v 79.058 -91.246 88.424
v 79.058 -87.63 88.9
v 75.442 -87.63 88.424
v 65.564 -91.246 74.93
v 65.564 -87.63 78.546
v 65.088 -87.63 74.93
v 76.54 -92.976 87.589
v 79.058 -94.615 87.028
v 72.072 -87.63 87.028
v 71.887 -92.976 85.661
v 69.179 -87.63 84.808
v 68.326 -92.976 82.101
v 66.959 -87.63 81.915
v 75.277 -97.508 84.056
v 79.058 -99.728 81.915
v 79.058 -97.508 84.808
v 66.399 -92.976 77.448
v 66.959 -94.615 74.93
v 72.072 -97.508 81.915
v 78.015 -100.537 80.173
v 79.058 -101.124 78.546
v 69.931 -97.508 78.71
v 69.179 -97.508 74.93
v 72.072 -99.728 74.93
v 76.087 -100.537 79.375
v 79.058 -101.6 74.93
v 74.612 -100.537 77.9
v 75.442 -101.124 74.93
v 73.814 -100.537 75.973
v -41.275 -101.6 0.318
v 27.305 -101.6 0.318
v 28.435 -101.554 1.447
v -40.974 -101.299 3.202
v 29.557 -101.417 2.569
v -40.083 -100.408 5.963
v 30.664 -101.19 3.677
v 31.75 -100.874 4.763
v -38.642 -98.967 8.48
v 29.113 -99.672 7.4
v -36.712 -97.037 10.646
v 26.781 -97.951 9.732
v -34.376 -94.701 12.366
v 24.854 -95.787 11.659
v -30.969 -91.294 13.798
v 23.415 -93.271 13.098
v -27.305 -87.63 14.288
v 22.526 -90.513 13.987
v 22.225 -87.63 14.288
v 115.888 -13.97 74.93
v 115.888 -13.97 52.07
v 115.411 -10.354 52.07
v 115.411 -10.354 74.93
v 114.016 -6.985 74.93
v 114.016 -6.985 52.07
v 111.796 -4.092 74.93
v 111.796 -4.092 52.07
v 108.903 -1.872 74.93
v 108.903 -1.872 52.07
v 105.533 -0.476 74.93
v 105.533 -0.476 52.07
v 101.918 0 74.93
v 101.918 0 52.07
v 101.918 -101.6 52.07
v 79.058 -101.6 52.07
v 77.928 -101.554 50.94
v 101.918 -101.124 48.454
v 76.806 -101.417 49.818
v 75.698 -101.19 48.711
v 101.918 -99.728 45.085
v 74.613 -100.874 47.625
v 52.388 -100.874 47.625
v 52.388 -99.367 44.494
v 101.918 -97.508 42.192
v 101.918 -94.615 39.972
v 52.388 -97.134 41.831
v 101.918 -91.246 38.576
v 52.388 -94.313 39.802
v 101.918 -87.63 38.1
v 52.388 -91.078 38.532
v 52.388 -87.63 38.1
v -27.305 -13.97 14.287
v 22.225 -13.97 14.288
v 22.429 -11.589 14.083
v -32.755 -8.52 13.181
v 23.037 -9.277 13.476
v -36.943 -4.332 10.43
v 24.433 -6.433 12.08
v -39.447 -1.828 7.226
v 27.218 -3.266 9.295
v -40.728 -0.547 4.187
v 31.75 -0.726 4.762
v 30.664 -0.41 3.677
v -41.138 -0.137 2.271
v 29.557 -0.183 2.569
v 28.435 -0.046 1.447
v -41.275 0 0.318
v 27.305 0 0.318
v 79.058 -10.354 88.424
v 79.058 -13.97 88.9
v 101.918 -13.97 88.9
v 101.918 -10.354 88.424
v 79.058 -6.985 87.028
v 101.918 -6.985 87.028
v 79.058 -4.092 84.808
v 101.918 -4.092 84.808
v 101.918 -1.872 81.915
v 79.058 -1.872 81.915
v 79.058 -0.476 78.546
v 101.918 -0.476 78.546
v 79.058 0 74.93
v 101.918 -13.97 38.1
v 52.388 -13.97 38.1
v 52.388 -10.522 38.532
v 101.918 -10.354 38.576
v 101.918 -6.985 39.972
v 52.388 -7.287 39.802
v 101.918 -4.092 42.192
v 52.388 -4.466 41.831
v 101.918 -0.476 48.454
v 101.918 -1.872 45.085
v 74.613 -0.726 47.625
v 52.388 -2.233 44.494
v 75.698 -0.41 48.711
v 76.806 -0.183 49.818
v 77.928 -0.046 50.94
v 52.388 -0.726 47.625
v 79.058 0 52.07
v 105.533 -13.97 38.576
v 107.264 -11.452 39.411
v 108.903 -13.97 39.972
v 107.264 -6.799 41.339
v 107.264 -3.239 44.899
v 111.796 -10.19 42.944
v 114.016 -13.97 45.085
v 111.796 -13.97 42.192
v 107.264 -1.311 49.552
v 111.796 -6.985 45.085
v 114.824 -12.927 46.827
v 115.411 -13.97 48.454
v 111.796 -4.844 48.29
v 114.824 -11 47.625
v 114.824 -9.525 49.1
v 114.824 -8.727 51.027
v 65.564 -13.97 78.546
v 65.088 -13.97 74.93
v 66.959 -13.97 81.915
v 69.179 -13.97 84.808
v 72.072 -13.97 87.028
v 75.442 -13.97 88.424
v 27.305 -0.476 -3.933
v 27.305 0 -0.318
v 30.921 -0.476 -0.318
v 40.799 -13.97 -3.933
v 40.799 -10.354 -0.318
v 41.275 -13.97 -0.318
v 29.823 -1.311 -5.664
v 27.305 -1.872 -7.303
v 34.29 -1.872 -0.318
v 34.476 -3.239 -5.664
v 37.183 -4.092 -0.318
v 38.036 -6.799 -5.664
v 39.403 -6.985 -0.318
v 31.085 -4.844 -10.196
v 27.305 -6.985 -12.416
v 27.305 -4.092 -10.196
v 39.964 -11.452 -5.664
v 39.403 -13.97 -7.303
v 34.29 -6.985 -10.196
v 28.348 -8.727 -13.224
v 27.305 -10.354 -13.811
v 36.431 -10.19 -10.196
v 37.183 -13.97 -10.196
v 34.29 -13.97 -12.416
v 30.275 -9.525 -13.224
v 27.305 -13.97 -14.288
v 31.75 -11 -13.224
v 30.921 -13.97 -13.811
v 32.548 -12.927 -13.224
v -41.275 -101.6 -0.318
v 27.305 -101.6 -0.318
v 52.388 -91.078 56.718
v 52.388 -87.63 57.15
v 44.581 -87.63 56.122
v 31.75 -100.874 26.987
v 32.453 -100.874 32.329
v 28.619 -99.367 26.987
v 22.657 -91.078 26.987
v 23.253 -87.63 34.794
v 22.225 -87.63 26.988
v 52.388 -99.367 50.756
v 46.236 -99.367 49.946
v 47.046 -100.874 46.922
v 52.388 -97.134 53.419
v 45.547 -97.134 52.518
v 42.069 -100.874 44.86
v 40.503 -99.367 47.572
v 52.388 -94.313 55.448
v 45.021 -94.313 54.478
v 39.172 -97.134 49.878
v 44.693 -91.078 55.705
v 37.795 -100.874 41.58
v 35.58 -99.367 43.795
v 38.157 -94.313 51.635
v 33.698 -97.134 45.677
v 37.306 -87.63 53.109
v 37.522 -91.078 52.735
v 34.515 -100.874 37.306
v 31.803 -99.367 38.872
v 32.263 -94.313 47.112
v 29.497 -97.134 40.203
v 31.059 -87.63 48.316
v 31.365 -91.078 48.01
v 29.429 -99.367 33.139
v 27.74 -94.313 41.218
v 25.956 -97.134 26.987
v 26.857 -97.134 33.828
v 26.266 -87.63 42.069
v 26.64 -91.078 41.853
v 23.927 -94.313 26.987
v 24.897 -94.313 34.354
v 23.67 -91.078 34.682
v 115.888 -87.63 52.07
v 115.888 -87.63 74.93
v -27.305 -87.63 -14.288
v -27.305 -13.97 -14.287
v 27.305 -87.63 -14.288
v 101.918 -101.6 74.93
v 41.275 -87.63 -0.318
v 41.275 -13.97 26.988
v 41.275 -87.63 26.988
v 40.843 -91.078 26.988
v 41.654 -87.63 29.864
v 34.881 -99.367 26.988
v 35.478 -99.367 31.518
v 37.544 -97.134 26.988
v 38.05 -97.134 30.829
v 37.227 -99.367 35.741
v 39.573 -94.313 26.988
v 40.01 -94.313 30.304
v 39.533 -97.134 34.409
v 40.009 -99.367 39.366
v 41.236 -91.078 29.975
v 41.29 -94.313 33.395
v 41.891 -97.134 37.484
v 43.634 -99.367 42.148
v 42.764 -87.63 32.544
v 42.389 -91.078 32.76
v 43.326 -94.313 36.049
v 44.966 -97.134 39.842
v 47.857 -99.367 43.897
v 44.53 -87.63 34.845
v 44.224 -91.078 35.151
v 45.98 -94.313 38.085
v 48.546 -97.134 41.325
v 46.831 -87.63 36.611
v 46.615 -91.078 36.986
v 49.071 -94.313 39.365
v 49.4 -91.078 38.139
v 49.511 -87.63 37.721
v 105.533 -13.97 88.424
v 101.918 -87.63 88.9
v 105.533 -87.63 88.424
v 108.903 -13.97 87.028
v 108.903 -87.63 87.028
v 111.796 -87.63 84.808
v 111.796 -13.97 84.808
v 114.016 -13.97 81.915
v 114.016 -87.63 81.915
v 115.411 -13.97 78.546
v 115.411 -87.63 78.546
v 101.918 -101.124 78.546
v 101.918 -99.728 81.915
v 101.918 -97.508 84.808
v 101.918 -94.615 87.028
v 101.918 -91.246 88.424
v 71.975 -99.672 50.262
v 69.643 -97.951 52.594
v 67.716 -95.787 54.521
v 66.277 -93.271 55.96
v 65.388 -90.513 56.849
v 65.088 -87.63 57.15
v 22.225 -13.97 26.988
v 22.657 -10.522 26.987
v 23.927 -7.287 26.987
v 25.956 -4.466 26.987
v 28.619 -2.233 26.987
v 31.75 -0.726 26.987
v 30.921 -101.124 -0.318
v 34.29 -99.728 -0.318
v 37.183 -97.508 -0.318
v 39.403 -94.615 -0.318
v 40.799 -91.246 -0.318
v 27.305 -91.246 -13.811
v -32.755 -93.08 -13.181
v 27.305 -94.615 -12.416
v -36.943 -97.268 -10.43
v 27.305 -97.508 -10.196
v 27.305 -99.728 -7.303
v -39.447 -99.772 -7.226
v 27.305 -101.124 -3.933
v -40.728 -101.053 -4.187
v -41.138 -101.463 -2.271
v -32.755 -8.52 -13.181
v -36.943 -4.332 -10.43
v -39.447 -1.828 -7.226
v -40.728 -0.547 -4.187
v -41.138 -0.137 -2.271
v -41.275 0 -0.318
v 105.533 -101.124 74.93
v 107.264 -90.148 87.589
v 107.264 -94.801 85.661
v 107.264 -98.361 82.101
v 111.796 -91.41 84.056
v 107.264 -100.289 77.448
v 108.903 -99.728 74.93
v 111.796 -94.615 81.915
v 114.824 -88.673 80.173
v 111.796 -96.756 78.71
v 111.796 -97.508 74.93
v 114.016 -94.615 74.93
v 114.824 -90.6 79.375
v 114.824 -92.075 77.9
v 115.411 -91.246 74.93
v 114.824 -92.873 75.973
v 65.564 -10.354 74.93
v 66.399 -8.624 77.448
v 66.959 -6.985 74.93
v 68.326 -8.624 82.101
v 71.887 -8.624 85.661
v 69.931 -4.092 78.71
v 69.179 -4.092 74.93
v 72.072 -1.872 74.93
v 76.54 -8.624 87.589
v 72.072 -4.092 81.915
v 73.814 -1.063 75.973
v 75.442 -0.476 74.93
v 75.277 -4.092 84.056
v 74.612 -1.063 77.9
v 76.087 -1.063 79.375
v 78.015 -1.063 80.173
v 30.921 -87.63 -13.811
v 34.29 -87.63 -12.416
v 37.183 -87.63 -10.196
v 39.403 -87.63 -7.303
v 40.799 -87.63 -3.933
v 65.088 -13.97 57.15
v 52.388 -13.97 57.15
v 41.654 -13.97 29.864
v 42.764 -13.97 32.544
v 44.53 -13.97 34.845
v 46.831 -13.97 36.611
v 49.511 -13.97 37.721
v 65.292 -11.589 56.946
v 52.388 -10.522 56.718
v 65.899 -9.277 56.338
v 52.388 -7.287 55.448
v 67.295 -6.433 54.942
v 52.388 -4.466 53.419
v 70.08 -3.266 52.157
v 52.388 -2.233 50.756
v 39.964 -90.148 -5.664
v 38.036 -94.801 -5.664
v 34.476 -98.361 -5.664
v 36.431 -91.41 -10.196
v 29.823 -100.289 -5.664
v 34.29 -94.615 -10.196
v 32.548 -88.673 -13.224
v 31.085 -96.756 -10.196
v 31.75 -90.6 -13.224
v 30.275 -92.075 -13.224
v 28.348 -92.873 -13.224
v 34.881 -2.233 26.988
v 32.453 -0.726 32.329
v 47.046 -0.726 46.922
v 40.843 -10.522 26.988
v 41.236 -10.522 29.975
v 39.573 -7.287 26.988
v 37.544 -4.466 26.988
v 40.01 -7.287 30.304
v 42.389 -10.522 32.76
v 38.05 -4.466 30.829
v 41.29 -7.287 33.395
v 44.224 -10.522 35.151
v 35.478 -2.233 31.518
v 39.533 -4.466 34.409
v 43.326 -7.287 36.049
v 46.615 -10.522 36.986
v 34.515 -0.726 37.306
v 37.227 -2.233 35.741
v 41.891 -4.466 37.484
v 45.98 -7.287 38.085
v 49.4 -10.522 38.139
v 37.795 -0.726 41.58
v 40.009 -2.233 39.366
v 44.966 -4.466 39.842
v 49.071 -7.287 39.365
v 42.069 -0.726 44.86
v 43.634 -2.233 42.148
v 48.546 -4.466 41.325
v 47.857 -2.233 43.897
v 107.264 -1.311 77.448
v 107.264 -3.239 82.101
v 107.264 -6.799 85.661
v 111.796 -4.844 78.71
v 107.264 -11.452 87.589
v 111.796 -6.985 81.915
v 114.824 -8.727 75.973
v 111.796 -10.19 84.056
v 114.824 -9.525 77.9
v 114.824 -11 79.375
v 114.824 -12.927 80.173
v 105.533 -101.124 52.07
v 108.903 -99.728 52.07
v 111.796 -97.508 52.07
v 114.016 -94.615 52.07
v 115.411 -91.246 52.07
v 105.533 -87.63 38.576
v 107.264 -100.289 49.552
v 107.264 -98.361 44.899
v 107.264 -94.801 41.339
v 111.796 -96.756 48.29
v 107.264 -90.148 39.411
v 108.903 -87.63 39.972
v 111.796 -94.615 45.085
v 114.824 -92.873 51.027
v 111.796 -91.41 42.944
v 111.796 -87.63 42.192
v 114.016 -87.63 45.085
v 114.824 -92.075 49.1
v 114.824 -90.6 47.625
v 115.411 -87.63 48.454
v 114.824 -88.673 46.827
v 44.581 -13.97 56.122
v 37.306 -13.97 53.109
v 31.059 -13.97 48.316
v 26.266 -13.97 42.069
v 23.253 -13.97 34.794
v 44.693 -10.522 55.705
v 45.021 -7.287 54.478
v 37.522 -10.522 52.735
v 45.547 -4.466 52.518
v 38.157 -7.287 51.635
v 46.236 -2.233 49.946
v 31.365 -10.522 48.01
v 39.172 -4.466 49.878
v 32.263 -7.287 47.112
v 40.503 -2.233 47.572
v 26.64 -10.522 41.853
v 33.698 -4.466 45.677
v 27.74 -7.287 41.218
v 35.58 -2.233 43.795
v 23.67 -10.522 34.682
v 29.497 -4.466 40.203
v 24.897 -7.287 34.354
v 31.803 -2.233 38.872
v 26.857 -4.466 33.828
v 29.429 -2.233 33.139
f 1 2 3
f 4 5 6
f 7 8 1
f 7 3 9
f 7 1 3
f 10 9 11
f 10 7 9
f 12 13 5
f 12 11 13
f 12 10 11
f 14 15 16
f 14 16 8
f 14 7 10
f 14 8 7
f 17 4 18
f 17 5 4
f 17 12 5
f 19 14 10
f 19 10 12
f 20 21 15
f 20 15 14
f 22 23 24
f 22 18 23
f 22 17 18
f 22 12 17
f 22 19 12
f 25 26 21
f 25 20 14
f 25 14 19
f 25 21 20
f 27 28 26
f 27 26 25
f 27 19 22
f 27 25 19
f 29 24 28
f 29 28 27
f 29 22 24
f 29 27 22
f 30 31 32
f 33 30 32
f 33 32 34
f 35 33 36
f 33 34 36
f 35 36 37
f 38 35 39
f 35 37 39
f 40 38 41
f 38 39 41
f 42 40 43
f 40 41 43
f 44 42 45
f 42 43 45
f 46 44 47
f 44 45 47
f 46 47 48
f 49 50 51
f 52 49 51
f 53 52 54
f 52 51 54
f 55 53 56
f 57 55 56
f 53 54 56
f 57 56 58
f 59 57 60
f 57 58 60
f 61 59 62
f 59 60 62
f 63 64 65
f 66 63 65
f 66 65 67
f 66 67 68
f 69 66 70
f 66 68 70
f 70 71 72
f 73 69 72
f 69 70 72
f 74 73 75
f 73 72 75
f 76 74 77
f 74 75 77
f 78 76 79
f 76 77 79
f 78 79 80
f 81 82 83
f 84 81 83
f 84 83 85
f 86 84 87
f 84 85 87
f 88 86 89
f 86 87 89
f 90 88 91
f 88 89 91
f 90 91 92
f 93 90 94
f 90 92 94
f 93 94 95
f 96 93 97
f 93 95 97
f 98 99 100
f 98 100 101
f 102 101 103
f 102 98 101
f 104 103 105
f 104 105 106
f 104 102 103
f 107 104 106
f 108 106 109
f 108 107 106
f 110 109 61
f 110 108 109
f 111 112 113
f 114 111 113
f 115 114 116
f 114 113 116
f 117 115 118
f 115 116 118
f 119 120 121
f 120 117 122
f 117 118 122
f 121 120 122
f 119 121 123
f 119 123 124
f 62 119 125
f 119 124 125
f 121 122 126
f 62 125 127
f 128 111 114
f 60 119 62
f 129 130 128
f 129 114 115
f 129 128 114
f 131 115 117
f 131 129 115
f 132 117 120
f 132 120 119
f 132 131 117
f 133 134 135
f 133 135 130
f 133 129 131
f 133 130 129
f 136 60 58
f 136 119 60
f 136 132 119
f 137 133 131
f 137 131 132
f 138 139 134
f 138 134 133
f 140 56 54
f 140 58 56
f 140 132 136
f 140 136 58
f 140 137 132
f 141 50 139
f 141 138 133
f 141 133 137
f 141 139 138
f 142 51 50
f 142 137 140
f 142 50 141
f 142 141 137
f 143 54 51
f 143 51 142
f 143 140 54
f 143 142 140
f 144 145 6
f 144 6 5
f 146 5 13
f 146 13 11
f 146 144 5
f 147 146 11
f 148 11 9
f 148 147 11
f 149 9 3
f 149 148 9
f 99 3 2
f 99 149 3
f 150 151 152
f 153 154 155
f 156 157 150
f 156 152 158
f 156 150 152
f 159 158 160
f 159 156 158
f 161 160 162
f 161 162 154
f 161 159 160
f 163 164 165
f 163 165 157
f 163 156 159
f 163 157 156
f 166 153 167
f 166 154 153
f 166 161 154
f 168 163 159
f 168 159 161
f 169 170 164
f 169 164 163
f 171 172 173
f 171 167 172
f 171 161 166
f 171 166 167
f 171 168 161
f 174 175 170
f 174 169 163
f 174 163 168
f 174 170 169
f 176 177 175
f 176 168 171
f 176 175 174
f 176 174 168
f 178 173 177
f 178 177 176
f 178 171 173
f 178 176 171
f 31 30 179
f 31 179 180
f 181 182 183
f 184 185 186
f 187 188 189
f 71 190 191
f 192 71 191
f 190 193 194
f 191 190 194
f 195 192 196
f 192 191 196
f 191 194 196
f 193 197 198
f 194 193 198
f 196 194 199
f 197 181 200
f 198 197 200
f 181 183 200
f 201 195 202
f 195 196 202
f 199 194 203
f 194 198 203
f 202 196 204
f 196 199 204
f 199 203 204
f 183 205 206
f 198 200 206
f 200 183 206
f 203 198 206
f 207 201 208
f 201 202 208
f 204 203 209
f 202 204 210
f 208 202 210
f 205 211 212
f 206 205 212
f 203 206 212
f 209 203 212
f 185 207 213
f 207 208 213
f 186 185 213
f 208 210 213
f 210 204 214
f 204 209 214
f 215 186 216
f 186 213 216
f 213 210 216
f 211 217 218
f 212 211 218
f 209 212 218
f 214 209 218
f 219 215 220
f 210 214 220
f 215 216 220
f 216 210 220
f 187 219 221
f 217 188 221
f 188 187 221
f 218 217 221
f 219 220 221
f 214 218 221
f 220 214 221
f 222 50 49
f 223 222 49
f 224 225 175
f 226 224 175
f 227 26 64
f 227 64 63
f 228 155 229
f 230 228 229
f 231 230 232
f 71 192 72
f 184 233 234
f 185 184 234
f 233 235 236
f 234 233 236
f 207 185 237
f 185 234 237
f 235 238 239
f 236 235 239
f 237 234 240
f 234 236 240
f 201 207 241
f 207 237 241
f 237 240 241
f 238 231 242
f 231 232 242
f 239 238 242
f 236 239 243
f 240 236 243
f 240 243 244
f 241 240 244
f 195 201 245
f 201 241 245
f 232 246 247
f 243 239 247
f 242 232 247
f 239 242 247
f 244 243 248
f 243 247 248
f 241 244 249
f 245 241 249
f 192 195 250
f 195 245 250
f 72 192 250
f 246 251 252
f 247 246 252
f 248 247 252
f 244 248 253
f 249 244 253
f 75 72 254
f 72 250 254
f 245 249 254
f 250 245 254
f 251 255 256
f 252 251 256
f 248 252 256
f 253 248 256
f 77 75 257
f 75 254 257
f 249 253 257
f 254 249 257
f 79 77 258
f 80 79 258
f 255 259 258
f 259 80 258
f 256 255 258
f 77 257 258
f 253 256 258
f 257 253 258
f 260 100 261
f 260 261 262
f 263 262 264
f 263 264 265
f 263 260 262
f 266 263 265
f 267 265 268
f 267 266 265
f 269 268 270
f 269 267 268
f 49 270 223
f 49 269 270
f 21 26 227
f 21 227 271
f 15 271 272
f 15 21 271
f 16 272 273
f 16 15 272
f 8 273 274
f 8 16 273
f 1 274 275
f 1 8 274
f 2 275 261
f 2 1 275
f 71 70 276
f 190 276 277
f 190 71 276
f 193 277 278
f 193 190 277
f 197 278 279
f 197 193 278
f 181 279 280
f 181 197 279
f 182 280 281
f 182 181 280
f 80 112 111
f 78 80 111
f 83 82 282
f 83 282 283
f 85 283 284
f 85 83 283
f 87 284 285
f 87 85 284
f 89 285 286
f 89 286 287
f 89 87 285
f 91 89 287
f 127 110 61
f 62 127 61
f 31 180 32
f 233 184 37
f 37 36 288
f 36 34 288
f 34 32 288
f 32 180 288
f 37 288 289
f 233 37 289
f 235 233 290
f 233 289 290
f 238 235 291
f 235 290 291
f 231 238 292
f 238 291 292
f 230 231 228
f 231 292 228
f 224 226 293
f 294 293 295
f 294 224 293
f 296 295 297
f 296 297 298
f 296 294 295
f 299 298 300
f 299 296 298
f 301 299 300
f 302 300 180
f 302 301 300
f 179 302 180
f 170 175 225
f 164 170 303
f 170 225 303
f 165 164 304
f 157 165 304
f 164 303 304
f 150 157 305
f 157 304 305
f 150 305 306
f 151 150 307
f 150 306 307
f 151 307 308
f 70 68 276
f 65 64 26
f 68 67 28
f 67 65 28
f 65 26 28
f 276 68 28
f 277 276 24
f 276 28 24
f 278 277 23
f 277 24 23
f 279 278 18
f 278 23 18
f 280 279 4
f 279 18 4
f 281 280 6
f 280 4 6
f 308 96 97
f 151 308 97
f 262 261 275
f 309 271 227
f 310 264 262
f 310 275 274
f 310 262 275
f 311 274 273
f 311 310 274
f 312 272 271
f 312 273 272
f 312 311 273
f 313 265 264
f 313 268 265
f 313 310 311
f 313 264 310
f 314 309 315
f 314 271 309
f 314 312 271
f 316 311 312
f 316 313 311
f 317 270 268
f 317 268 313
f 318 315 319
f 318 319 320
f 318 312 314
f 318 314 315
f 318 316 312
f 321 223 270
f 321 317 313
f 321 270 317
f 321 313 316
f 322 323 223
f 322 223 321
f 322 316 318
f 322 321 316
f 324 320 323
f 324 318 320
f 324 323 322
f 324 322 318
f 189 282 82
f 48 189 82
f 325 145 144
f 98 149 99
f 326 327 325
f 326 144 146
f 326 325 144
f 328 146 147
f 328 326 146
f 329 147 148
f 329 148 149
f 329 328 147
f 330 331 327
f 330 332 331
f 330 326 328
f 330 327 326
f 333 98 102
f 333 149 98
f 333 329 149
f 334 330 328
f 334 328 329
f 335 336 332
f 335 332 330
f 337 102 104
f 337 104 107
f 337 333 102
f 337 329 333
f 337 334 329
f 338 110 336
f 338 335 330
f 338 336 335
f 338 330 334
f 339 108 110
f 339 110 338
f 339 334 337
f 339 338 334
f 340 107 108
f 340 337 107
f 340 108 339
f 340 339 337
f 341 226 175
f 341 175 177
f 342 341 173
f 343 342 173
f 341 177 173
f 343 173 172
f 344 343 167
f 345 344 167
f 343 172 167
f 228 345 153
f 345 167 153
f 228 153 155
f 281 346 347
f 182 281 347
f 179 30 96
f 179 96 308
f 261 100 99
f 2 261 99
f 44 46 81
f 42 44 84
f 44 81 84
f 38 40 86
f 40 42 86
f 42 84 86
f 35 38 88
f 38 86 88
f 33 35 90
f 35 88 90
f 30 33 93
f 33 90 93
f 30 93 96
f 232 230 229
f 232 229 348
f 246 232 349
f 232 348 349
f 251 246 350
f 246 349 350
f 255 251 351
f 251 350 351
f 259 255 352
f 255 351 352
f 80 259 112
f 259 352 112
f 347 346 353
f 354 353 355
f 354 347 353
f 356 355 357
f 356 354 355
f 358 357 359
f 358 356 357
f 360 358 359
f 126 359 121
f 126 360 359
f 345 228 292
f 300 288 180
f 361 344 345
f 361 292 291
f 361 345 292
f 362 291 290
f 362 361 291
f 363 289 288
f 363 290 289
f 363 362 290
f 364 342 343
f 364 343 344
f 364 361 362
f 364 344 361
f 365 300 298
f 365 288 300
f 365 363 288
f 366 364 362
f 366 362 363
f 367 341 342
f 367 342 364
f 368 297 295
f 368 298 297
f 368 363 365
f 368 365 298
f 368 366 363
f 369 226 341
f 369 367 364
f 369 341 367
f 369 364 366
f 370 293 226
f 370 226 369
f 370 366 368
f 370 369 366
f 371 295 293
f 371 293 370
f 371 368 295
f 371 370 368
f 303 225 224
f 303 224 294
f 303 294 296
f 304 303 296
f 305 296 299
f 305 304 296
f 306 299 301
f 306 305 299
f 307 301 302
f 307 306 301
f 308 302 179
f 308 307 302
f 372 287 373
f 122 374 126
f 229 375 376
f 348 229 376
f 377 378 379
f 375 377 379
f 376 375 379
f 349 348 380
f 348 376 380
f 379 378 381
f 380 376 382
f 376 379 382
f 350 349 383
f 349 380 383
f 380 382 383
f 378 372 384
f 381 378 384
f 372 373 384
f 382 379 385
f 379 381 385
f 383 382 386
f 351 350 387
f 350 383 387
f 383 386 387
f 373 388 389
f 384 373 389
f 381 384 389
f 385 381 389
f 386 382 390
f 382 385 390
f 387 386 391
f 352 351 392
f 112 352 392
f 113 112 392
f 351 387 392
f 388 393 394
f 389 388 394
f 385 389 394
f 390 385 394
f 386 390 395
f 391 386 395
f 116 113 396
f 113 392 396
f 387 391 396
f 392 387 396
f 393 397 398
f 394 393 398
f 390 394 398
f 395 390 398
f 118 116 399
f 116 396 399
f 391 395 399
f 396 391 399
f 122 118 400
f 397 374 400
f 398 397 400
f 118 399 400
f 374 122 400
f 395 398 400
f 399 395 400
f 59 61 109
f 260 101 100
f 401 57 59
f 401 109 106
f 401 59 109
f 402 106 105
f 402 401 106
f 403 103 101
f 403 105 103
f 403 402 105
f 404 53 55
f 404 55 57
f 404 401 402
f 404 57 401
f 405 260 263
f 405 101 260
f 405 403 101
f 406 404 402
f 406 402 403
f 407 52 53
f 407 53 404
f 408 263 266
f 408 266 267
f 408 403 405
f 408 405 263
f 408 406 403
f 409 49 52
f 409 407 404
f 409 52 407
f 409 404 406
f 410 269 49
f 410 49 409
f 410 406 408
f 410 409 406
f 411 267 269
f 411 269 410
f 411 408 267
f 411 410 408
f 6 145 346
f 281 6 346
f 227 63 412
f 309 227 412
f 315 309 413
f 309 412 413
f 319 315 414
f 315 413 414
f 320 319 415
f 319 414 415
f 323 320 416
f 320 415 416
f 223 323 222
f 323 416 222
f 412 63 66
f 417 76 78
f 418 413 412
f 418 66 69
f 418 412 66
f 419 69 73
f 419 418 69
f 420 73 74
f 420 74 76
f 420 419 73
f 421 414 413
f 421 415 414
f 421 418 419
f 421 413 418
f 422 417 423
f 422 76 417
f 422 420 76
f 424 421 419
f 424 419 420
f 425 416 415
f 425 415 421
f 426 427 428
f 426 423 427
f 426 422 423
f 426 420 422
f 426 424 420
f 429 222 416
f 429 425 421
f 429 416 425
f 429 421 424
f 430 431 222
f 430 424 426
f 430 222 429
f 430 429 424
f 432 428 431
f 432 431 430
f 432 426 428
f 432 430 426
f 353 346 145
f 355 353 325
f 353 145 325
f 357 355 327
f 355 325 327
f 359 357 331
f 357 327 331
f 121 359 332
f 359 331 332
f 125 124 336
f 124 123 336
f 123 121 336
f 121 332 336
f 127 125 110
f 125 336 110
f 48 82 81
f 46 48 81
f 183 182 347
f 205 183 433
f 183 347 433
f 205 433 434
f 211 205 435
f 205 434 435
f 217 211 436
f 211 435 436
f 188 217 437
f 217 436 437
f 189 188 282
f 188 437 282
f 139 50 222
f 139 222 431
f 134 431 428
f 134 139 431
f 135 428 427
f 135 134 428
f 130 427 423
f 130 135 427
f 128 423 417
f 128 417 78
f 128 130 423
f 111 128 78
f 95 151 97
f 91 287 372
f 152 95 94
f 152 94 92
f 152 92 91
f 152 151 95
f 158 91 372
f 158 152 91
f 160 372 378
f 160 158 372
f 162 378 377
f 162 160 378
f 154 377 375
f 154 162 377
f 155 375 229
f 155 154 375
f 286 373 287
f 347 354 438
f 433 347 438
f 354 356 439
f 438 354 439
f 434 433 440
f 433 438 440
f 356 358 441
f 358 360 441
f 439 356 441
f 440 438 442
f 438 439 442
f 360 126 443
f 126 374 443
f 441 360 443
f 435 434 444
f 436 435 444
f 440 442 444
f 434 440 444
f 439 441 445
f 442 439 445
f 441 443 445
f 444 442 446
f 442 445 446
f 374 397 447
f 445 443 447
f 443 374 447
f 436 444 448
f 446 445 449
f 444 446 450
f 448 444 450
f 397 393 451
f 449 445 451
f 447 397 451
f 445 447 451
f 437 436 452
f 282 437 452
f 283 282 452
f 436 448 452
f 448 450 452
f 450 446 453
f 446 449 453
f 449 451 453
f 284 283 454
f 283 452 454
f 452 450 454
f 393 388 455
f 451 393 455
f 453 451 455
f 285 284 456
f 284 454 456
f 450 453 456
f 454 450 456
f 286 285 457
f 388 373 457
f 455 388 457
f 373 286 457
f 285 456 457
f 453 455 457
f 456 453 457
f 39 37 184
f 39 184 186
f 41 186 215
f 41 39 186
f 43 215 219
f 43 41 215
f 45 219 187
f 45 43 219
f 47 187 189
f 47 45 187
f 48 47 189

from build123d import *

# Parameters (mm, degrees)
F1_DEPTH      = 101.6
F2_T1_DEPTH   = 22.86
F2_T3_DEPTH   = 17.78
F2_T5_DEPTH   = 73.66
F2_T7_DEPTH   = 22.86
F2_T9_DEPTH   = 49.53
F2_T11_DEPTH  = 12.7
F2_T13_DEPTH  = 98.425
F2_T15_DEPTH  = 171.45
F2_T17_DEPTH  = 103.505
F2_T19_DEPTH  = 12.7
F2_T21_DEPTH  = 27.305
F2_S25_W      = 13.97
F2_S25_H      = 13.97
F2_T26_DEPTH  = 13.97
F2_S31_W      = 13.97
F2_S31_H      = 13.97
F2_T32_DEPTH  = 13.97
F2_S37_W      = 13.97
F2_S37_H      = 13.97
F2_T38_DEPTH  = 13.97
F2_S43_W      = 13.97
F2_S43_H      = 13.97
F2_T44_DEPTH  = 13.97
F2_S49_W      = 13.97
F2_S49_H      = 13.97
F2_T50_DEPTH  = 13.97
F2_S55_W      = 13.97
F2_S55_H      = 13.97
F2_T56_DEPTH  = 13.97
F2_S61_W      = 13.97
F2_S61_H      = 13.97
F2_T62_DEPTH  = 13.97
F2_S67_W      = 13.97
F2_S67_H      = 13.97
F2_T68_DEPTH  = 13.97
F2_T72_ANGLE  = 90
F2_T74_ANGLE  = 90
F2_T76_ANGLE  = 90
F2_T78_ANGLE  = 90
F2_T83_DEPTH  = 52.705
F2_T87_DEPTH  = 47.625
F2_T94_DEPTH  = 47.625
F2_T98_DEPTH  = 52.705
F2_T105_DEPTH = 47.625
F2_T109_DEPTH = 133.35
F2_T116_DEPTH = 133.35
F2_T120_DEPTH = 47.625


# Not quite as in the source:
# - a fillet or chamfer that OpenCascade refuses, or shapes differently, is made with other operations: its cross-section is extruded or revolved along the edge and cut away or added


with BuildPart() as f1:
    # F0 (on Front) → F1 (new body)
    with BuildSketch(Plane.XZ):
        with BuildLine():
            Line((-41.275, -14.2875), (41.275, -14.2875))
            Line((41.275, -14.2875), (41.275, 14.2875))
            Line((41.275, 14.2875), (41.275, 26.9875))
            ThreePointArc((41.275, 26.9875), (44.5297758941, 34.8452241059), (52.3875, 38.1))
            Line((52.3875, 38.1), (65.0875, 38.1))
            Line((65.0875, 38.1), (115.8875, 38.1))
            Line((115.8875, 38.1), (115.8875, 88.9))
            Line((115.8875, 88.9), (65.0875, 88.9))
            Line((65.0875, 88.9), (65.0875, 57.15))
            Line((65.0875, 57.15), (52.3875, 57.15))
            ThreePointArc((52.3875, 57.15), (31.0593917125, 48.3156082875), (22.225, 26.9875))
            Line((22.225, 26.9875), (22.225, 14.2875))
            Line((22.225, 14.2875), (-41.275, 14.2875))
            Line((-41.275, 14.2875), (-41.275, -14.2875))
        make_face()
    extrude(amount=F1_DEPTH)

    # F2: fillet of radius 13.97 on 20 edges, made by hand

    # F2_s2 → F2_t1 (cut)
    with BuildSketch(Plane.YZ.offset(79.0575)):
        with BuildLine():
            ThreePointArc((-101.6, 74.93), (-97.5082817332, 84.8082817332), (-87.63, 88.9))
            Line((-87.63, 88.9), (-101.6, 88.9))
            Line((-101.6, 88.9), (-101.6, 74.93))
        make_face()
        with BuildLine():
            ThreePointArc((-13.97, 88.9), (-4.0917182668, 84.8082817332), (0, 74.93))
            Line((0, 74.93), (0, 88.9))
            Line((0, 88.9), (-13.97, 88.9))
        make_face()
    extrude(amount=F2_T1_DEPTH, mode=Mode.SUBTRACT)

    # F2_s4 → F2_t3 (cut)
    with BuildSketch(Plane.XY.offset(57.15)):
        with BuildLine():
            ThreePointArc((79.0575, -101.6), (69.1792182668, -97.5082817332), (65.0875, -87.63))
            Line((65.0875, -87.63), (65.0875, -101.6))
            Line((65.0875, -101.6), (79.0575, -101.6))
        make_face()
        with BuildLine():
            ThreePointArc((65.0875, -13.97), (69.1792182668, -4.0917182668), (79.0575, 0))
            Line((79.0575, 0), (65.0875, 0))
            Line((65.0875, 0), (65.0875, -13.97))
        make_face()
    extrude(amount=F2_T3_DEPTH, mode=Mode.SUBTRACT)

    # F2_s6 → F2_t5 (cut)
    with BuildSketch(Plane.XZ.offset(13.97)):
        with BuildLine():
            ThreePointArc((101.9175, 88.9), (111.7957817332, 84.8082817332), (115.8875, 74.93))
            Line((115.8875, 74.93), (115.8875, 88.9))
            Line((115.8875, 88.9), (101.9175, 88.9))
        make_face()
        with BuildLine():
            ThreePointArc((65.0875, 74.93), (69.1792182668, 84.8082817332), (79.0575, 88.9))
            Line((79.0575, 88.9), (65.0875, 88.9))
            Line((65.0875, 88.9), (65.0875, 74.93))
        make_face()
        with BuildLine():
            ThreePointArc((115.8875, 52.07), (111.7957817332, 42.1917182668), (101.9175, 38.1))
            Line((101.9175, 38.1), (115.8875, 38.1))
            Line((115.8875, 38.1), (115.8875, 52.07))
        make_face()
        with BuildLine():
            ThreePointArc((27.305, -14.2875), (37.1832817332, -10.1957817332), (41.275, -0.3175))
            Line((41.275, -0.3175), (41.275, -14.2875))
            Line((41.275, -14.2875), (27.305, -14.2875))
        make_face()
    extrude(amount=F2_T5_DEPTH, mode=Mode.SUBTRACT)

    # F2_s8 → F2_t7 (cut)
    with BuildSketch(Plane.XY.offset(52.07)):
        with BuildLine():
            ThreePointArc((101.9175, -101.6), (111.7957817332, -97.5082817332), (115.8875, -87.63))
            Line((115.8875, -87.63), (115.8875, -101.6))
            Line((115.8875, -101.6), (101.9175, -101.6))
        make_face()
        with BuildLine():
            ThreePointArc((115.8875, -13.97), (111.7957817332, -4.0917182668), (101.9175, 0))
            Line((101.9175, 0), (115.8875, 0))
            Line((115.8875, 0), (115.8875, -13.97))
        make_face()
    extrude(amount=F2_T7_DEPTH, mode=Mode.SUBTRACT)

    # F2_s10 → F2_t9 (cut)
    with BuildSketch(Plane.YZ.offset(52.3875)):
        with BuildLine():
            ThreePointArc((-101.6, 52.07), (-97.5082817332, 42.1917182668), (-87.63, 38.1))
            Line((-87.63, 38.1), (-101.6, 38.1))
            Line((-101.6, 38.1), (-101.6, 52.07))
        make_face()
        with BuildLine():
            ThreePointArc((-13.97, 38.1), (-4.0917182668, 42.1917182668), (0, 52.07))
            Line((0, 52.07), (0, 38.1))
            Line((0, 38.1), (-13.97, 38.1))
        make_face()
    extrude(amount=F2_T9_DEPTH, mode=Mode.SUBTRACT)

    # F2_s12 → F2_t11 (cut)
    with BuildSketch(Plane.XY.offset(14.2875)):
        with BuildLine():
            ThreePointArc((36.195, -101.6), (26.3167182668, -97.5082817332), (22.225, -87.63))
            Line((22.225, -87.63), (22.225, -101.6))
            Line((22.225, -101.6), (36.195, -101.6))
        make_face()
        with BuildLine():
            ThreePointArc((22.225, -13.97), (26.3167182668, -4.0917182668), (36.195, 0))
            Line((36.195, 0), (22.225, 0))
            Line((22.225, 0), (22.225, -13.97))
        make_face()
    extrude(amount=F2_T11_DEPTH, mode=Mode.SUBTRACT)

    # F2_s14 → F2_t13 (cut)
    with BuildSketch(Plane.YZ.offset(-76.2)):
        with BuildLine():
            ThreePointArc((-101.6, 0.3175), (-97.5082817332, 10.1957817332), (-87.63, 14.2875))
            Line((-87.63, 14.2875), (-101.6, 14.2875))
            Line((-101.6, 14.2875), (-101.6, 0.3175))
        make_face()
        with BuildLine():
            ThreePointArc((-13.97, 14.2875), (-4.0917182668, 10.1957817332), (0, 0.3175))
            Line((0, 0.3175), (0, 14.2875))
            Line((0, 14.2875), (-13.97, 14.2875))
        make_face()
    extrude(amount=F2_T13_DEPTH, mode=Mode.SUBTRACT)

    # F2_s16 → F2_t15 (cut)
    with BuildSketch(Plane.XZ.offset(-34.925)):
        with BuildLine():
            ThreePointArc((-27.305, 14.2875), (-37.1832817332, 10.1957817332), (-41.275, 0.3175))
            Line((-41.275, 0.3175), (-41.275, 14.2875))
            Line((-41.275, 14.2875), (-27.305, 14.2875))
        make_face()
        with BuildLine():
            ThreePointArc((-27.305, -14.2875), (-37.1832817332, -10.1957817332), (-41.275, -0.3175))
            Line((-41.275, -0.3175), (-41.275, -14.2875))
            Line((-41.275, -14.2875), (-27.305, -14.2875))
        make_face()
    extrude(amount=F2_T15_DEPTH, mode=Mode.SUBTRACT)

    # F2_s18 → F2_t17 (cut)
    with BuildSketch(Plane.YZ.offset(-76.2)):
        with BuildLine():
            ThreePointArc((-13.97, -14.2875), (-4.0917182668, -10.1957817332), (0, -0.3175))
            Line((0, -0.3175), (0, -14.2875))
            Line((0, -14.2875), (-13.97, -14.2875))
        make_face()
        with BuildLine():
            ThreePointArc((-87.63, -14.2875), (-97.5082817332, -10.1957817332), (-101.6, -0.3175))
            Line((-101.6, -0.3175), (-101.6, -14.2875))
            Line((-101.6, -14.2875), (-87.63, -14.2875))
        make_face()
    extrude(amount=F2_T17_DEPTH, mode=Mode.SUBTRACT)

    # F2_s20 → F2_t19 (cut)
    with BuildSketch(Plane.YZ.offset(52.3875)):
        with BuildLine():
            ThreePointArc((-13.97, 57.15), (-4.0917182668, 53.0582817332), (0, 43.18))
            Line((0, 43.18), (0, 57.15))
            Line((0, 57.15), (-13.97, 57.15))
        make_face()
        with BuildLine():
            ThreePointArc((-101.6, 43.18), (-97.5082817332, 53.0582817332), (-87.63, 57.15))
            Line((-87.63, 57.15), (-101.6, 57.15))
            Line((-101.6, 57.15), (-101.6, 43.18))
        make_face()
    extrude(amount=F2_T19_DEPTH, mode=Mode.SUBTRACT)

    # F2_s22 → F2_t21 (cut)
    with BuildSketch(Plane.XY.offset(-0.3175)):
        with BuildLine():
            ThreePointArc((27.305, 0), (37.1832817332, -4.0917182668), (41.275, -13.97))
            Line((41.275, -13.97), (41.275, 0))
            Line((41.275, 0), (27.305, 0))
        make_face()
        with BuildLine():
            ThreePointArc((27.305, -101.6), (37.1832817332, -97.5082817332), (41.275, -87.63))
            Line((41.275, -87.63), (41.275, -101.6))
            Line((41.275, -101.6), (27.305, -101.6))
        make_face()
    extrude(amount=F2_T21_DEPTH, mode=Mode.SUBTRACT)


with BuildPart() as f2_tool24:
    # F2_s25 → F2_t26 (new body)
    with BuildSketch(Plane.YZ.offset(101.9175)):
        with Locations((-94.615, 81.915)):
            Rectangle(F2_S25_W, F2_S25_H)
    extrude(amount=F2_T26_DEPTH)

    # F2_s27 → F2_t28 (revolve, cut)
    with BuildSketch(Plane(origin=(101.9175, -87.63, 74.93), x_dir=(0, 0.7071067812, -0.7071067812), z_dir=(0, -0.7071067812, -0.7071067812))):
        with BuildLine():
            ThreePointArc((0, -13.97), (13.97, 0), (0, 13.97))
            Line((0, 13.97), (0, -13.97))
        make_face()
    revolve(axis=Axis((101.9175, -87.63, 74.93), (1, 0, 0)), mode=Mode.SUBTRACT)


with BuildPart() as f1_1:
    add(f1.part)

    # F2_t23: cut F2_tool24
    add(f2_tool24.part, mode=Mode.SUBTRACT)


with BuildPart() as f2_tool30:
    # F2_s31 → F2_t32 (new body)
    with BuildSketch(Plane.XZ.offset(87.63)):
        with Locations((72.0725, 81.915)):
            Rectangle(F2_S31_W, F2_S31_H)
    extrude(amount=F2_T32_DEPTH)

    # F2_s33 → F2_t34 (revolve, cut)
    with BuildSketch(Plane(origin=(79.0575, -87.63, 74.93), x_dir=(0.7071067812, 0, -0.7071067812), z_dir=(-0.7071067812, 0, -0.7071067812))):
        with BuildLine():
            ThreePointArc((0, -13.97), (13.97, 0), (0, 13.97))
            Line((0, 13.97), (0, -13.97))
        make_face()
    revolve(axis=Axis((79.0575, -87.63, 74.93), (0, -1, 0)), mode=Mode.SUBTRACT)


with BuildPart() as f1_2:
    add(f1_1.part)

    # F2_t29: cut F2_tool30
    add(f2_tool30.part, mode=Mode.SUBTRACT)


with BuildPart() as f2_tool36:
    # F2_s37 → F2_t38 (new body)
    with BuildSketch(Plane.YZ.offset(101.9175)):
        with Locations((-6.985, 81.915)):
            Rectangle(F2_S37_W, F2_S37_H)
    extrude(amount=F2_T38_DEPTH)

    # F2_s39 → F2_t40 (revolve, cut)
    with BuildSketch(Plane(origin=(101.9175, -13.97, 74.93), x_dir=(0, -0.7071067812, -0.7071067812), z_dir=(0, -0.7071067812, 0.7071067812))):
        with BuildLine():
            ThreePointArc((0, -13.97), (13.97, 0), (0, 13.97))
            Line((0, 13.97), (0, -13.97))
        make_face()
    revolve(axis=Axis((101.9175, -13.97, 74.93), (1, 0, 0)), mode=Mode.SUBTRACT)


with BuildPart() as f1_3:
    add(f1_2.part)

    # F2_t35: cut F2_tool36
    add(f2_tool36.part, mode=Mode.SUBTRACT)


with BuildPart() as f2_tool42:
    # F2_s43 → F2_t44 (new body)
    with BuildSketch(Plane.XZ.offset(13.97)):
        with Locations((72.0725, 81.915)):
            Rectangle(F2_S43_W, F2_S43_H)
    extrude(amount=-F2_T44_DEPTH)

    # F2_s45 → F2_t46 (revolve, cut)
    with BuildSketch(Plane(origin=(79.0575, -13.97, 74.93), x_dir=(0.7071067812, 0, -0.7071067812), z_dir=(0.7071067812, 0, 0.7071067812))):
        with BuildLine():
            ThreePointArc((0, -13.97), (13.97, 0), (0, 13.97))
            Line((0, 13.97), (0, -13.97))
        make_face()
    revolve(axis=Axis((79.0575, -13.97, 74.93), (0, 1, 0)), mode=Mode.SUBTRACT)


with BuildPart() as f1_4:
    add(f1_3.part)

    # F2_t41: cut F2_tool42
    add(f2_tool42.part, mode=Mode.SUBTRACT)


with BuildPart() as f2_tool48:
    # F2_s49 → F2_t50 (new body)
    with BuildSketch(Plane.YZ.offset(101.9175)):
        with Locations((-94.615, 45.085)):
            Rectangle(F2_S49_W, F2_S49_H)
    extrude(amount=F2_T50_DEPTH)

    # F2_s51 → F2_t52 (revolve, cut)
    with BuildSketch(Plane(origin=(101.9175, -87.63, 52.07), x_dir=(0, 0.7071067812, 0.7071067812), z_dir=(0, 0.7071067812, -0.7071067812))):
        with BuildLine():
            ThreePointArc((0, -13.97), (13.97, 0), (0, 13.97))
            Line((0, 13.97), (0, -13.97))
        make_face()
    revolve(axis=Axis((101.9175, -87.63, 52.07), (1, 0, 0)), mode=Mode.SUBTRACT)


with BuildPart() as f1_5:
    add(f1_4.part)

    # F2_t47: cut F2_tool48
    add(f2_tool48.part, mode=Mode.SUBTRACT)


with BuildPart() as f2_tool54:
    # F2_s55 → F2_t56 (new body)
    with BuildSketch(Plane.YZ.offset(101.9175)):
        with Locations((-6.985, 45.085)):
            Rectangle(F2_S55_W, F2_S55_H)
    extrude(amount=F2_T56_DEPTH)

    # F2_s57 → F2_t58 (revolve, cut)
    with BuildSketch(Plane(origin=(101.9175, -13.97, 52.07), x_dir=(0, -0.7071067812, 0.7071067812), z_dir=(0, 0.7071067812, 0.7071067812))):
        with BuildLine():
            ThreePointArc((0, -13.97), (13.97, 0), (0, 13.97))
            Line((0, 13.97), (0, -13.97))
        make_face()
    revolve(axis=Axis((101.9175, -13.97, 52.07), (1, 0, 0)), mode=Mode.SUBTRACT)


with BuildPart() as f1_6:
    add(f1_5.part)

    # F2_t53: cut F2_tool54
    add(f2_tool54.part, mode=Mode.SUBTRACT)


with BuildPart() as f2_tool60:
    # F2_s61 → F2_t62 (new body)
    with BuildSketch(Plane.XY.offset(-0.3175)):
        with Locations((34.29, -6.985)):
            Rectangle(F2_S61_W, F2_S61_H)
    extrude(amount=-F2_T62_DEPTH)

    # F2_s63 → F2_t64 (revolve, cut)
    with BuildSketch(Plane(origin=(27.305, -13.97, -0.3175), x_dir=(-0.7071067812, -0.7071067812, 0), z_dir=(0.7071067812, -0.7071067812, 0))):
        with BuildLine():
            ThreePointArc((0, -13.97), (13.97, 0), (0, 13.97))
            Line((0, 13.97), (0, -13.97))
        make_face()
    revolve(axis=Axis((27.305, -13.97, -0.3175), (0, 0, -1)), mode=Mode.SUBTRACT)


with BuildPart() as f1_7:
    add(f1_6.part)

    # F2_t59: cut F2_tool60
    add(f2_tool60.part, mode=Mode.SUBTRACT)


with BuildPart() as f2_tool66:
    # F2_s67 → F2_t68 (new body)
    with BuildSketch(Plane.XY.offset(-0.3175)):
        with Locations((34.29, -94.615)):
            Rectangle(F2_S67_W, F2_S67_H)
    extrude(amount=-F2_T68_DEPTH)

    # F2_s69 → F2_t70 (revolve, cut)
    with BuildSketch(Plane(origin=(27.305, -87.63, -0.3175), x_dir=(-0.7071067812, 0.7071067812, 0), z_dir=(-0.7071067812, -0.7071067812, 0))):
        with BuildLine():
            ThreePointArc((0, -13.97), (13.97, 0), (0, 13.97))
            Line((0, 13.97), (0, -13.97))
        make_face()
    revolve(axis=Axis((27.305, -87.63, -0.3175), (0, 0, -1)), mode=Mode.SUBTRACT)


with BuildPart() as f1_8:
    add(f1_7.part)

    # F2_t65: cut F2_tool66
    add(f2_tool66.part, mode=Mode.SUBTRACT)

    # F2_s71 → F2_t72 (revolve, cut)
    with BuildSketch(Plane.YZ.offset(52.3875)):
        with BuildLine():
            ThreePointArc((-13.97, 57.15), (-4.0917182668, 53.0582817332), (0, 43.18))
            Line((0, 43.18), (0, 57.15))
            Line((0, 57.15), (-13.97, 57.15))
        make_face()
    revolve(axis=Axis((52.3875, 0, 26.9875), (0, -1, 0)), revolution_arc=F2_T72_ANGLE, mode=Mode.SUBTRACT)

    # F2_s73 → F2_t74 (revolve, cut)
    with BuildSketch(Plane.YZ.offset(52.3875)):
        with BuildLine():
            ThreePointArc((-101.6, 43.18), (-97.5082817332, 53.0582817332), (-87.63, 57.15))
            Line((-87.63, 57.15), (-101.6, 57.15))
            Line((-101.6, 57.15), (-101.6, 43.18))
        make_face()
    revolve(axis=Axis((52.3875, -101.6, 26.9875), (0, -1, 0)), revolution_arc=F2_T74_ANGLE, mode=Mode.SUBTRACT)

    # F2_s75 → F2_t76 (revolve, cut)
    with BuildSketch(Plane.XY.offset(26.9875)):
        with BuildLine():
            ThreePointArc((41.275, -13.97), (37.1832817332, -4.0917182668), (27.305, 0))
            Line((27.305, 0), (41.275, 0))
            Line((41.275, 0), (41.275, -13.97))
        make_face()
    revolve(axis=Axis((52.3875, 0, 26.9875), (0, 1, 0)), revolution_arc=F2_T76_ANGLE, mode=Mode.SUBTRACT)

    # F2_s77 → F2_t78 (revolve, cut)
    with BuildSketch(Plane.XY.offset(26.9875)):
        with BuildLine():
            ThreePointArc((27.305, -101.6), (37.1832817332, -97.5082817332), (41.275, -87.63))
            Line((41.275, -87.63), (41.275, -101.6))
            Line((41.275, -101.6), (27.305, -101.6))
        make_face()
    revolve(axis=Axis((52.3875, -101.6, 26.9875), (0, 1, 0)), revolution_arc=F2_T78_ANGLE, mode=Mode.SUBTRACT)


with BuildPart() as f2_tool81:
    # F2_s82 → F2_t83 (new body)
    with BuildSketch(Plane.XY.offset(74.93)):
        with BuildLine():
            ThreePointArc((79.0575, -101.6), (69.1792182668, -97.5082817332), (65.0875, -87.63))
            Line((65.0875, -87.63), (65.0875, -101.6))
            Line((65.0875, -101.6), (79.0575, -101.6))
        make_face()
    extrude(amount=-F2_T83_DEPTH)

    split(bisect_by=Plane.XY.offset(57.15), keep=Keep.BOTTOM)


with BuildPart() as f2_tool85:
    # F2_s86 → F2_t87 (new body)
    with BuildSketch(Plane.YZ.offset(100.0125)):
        with BuildLine():
            ThreePointArc((-101.6, 43.18), (-97.5082817332, 53.0582817332), (-87.63, 57.15))
            Line((-87.63, 57.15), (-101.6, 57.15))
            Line((-101.6, 57.15), (-101.6, 43.18))
        make_face()
    extrude(amount=-F2_T87_DEPTH)

    split(bisect_by=Plane.YZ.offset(65.0875), keep=Keep.TOP)


with BuildPart() as f2_tool81_1:
    add(f2_tool81.part)

    # F2_t89: intersect F2_tool85
    add(f2_tool85.part, mode=Mode.INTERSECT)


with BuildPart() as f1_9:
    add(f1_8.part)

    # F2_t79: cut F2_tool81
    add(f2_tool81_1.part, mode=Mode.SUBTRACT)


with BuildPart() as f2_tool92:
    # F2_s93 → F2_t94 (new body)
    with BuildSketch(Plane.YZ.offset(100.0125)):
        with BuildLine():
            ThreePointArc((-13.97, 57.15), (-4.0917182668, 53.0582817332), (0, 43.18))
            Line((0, 43.18), (0, 57.15))
            Line((0, 57.15), (-13.97, 57.15))
        make_face()
    extrude(amount=-F2_T94_DEPTH)

    split(bisect_by=Plane.YZ.offset(65.0875), keep=Keep.TOP)


with BuildPart() as f2_tool96:
    # F2_s97 → F2_t98 (new body)
    with BuildSketch(Plane.XY.offset(74.93)):
        with BuildLine():
            ThreePointArc((65.0875, -13.97), (69.1792182668, -4.0917182668), (79.0575, 0))
            Line((79.0575, 0), (65.0875, 0))
            Line((65.0875, 0), (65.0875, -13.97))
        make_face()
    extrude(amount=-F2_T98_DEPTH)

    split(bisect_by=Plane.XY.offset(57.15), keep=Keep.BOTTOM)


with BuildPart() as f2_tool92_1:
    add(f2_tool92.part)

    # F2_t100: intersect F2_tool96
    add(f2_tool96.part, mode=Mode.INTERSECT)


with BuildPart() as f1_10:
    add(f1_9.part)

    # F2_t90: cut F2_tool92
    add(f2_tool92_1.part, mode=Mode.SUBTRACT)


with BuildPart() as f2_tool103:
    # F2_s104 → F2_t105 (new body)
    with BuildSketch(Plane.XY.offset(26.9875)):
        with BuildLine():
            ThreePointArc((36.195, -101.6), (26.3167182668, -97.5082817332), (22.225, -87.63))
            Line((22.225, -87.63), (22.225, -101.6))
            Line((22.225, -101.6), (36.195, -101.6))
        make_face()
    extrude(amount=-F2_T105_DEPTH)

    split(bisect_by=Plane.XY.offset(14.2875), keep=Keep.BOTTOM)


with BuildPart() as f2_tool107:
    # F2_s108 → F2_t109 (new body)
    with BuildSketch(Plane.YZ.offset(57.15)):
        with BuildLine():
            ThreePointArc((-101.6, 0.3175), (-97.5082817332, 10.1957817332), (-87.63, 14.2875))
            Line((-87.63, 14.2875), (-101.6, 14.2875))
            Line((-101.6, 14.2875), (-101.6, 0.3175))
        make_face()
    extrude(amount=-F2_T109_DEPTH)

    split(bisect_by=Plane.YZ.offset(22.225), keep=Keep.TOP)


with BuildPart() as f2_tool103_1:
    add(f2_tool103.part)

    # F2_t111: intersect F2_tool107
    add(f2_tool107.part, mode=Mode.INTERSECT)


with BuildPart() as f1_11:
    add(f1_10.part)

    # F2_t101: cut F2_tool103
    add(f2_tool103_1.part, mode=Mode.SUBTRACT)


with BuildPart() as f2_tool114:
    # F2_s115 → F2_t116 (new body)
    with BuildSketch(Plane.YZ.offset(57.15)):
        with BuildLine():
            ThreePointArc((-13.97, 14.2875), (-4.0917182668, 10.1957817332), (0, 0.3175))
            Line((0, 0.3175), (0, 14.2875))
            Line((0, 14.2875), (-13.97, 14.2875))
        make_face()
    extrude(amount=-F2_T116_DEPTH)

    split(bisect_by=Plane.YZ.offset(22.225), keep=Keep.TOP)


with BuildPart() as f2_tool118:
    # F2_s119 → F2_t120 (new body)
    with BuildSketch(Plane.XY.offset(26.9875)):
        with BuildLine():
            ThreePointArc((22.225, -13.97), (26.3167182668, -4.0917182668), (36.195, 0))
            Line((36.195, 0), (22.225, 0))
            Line((22.225, 0), (22.225, -13.97))
        make_face()
    extrude(amount=-F2_T120_DEPTH)

    split(bisect_by=Plane.XY.offset(14.2875), keep=Keep.BOTTOM)


with BuildPart() as f2_tool114_1:
    add(f2_tool114.part)

    # F2_t122: intersect F2_tool118
    add(f2_tool118.part, mode=Mode.INTERSECT)


with BuildPart() as f1_12:
    add(f1_11.part)

    # F2_t112: cut F2_tool114
    add(f2_tool114_1.part, mode=Mode.SUBTRACT)


solid = f1_12.part
